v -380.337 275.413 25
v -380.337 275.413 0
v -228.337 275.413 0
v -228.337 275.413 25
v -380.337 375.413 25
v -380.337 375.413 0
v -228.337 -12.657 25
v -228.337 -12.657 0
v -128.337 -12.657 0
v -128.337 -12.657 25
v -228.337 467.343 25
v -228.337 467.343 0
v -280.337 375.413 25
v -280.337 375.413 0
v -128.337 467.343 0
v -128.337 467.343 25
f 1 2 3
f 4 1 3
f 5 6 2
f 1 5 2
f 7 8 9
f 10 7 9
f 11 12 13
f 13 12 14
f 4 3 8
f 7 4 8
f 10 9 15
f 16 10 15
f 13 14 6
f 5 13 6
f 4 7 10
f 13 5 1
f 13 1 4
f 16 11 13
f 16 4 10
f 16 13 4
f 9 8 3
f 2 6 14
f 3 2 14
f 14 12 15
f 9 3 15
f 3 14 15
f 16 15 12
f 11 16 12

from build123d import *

# Parameters (mm, degrees)
F1_DEPTH = 25
F2_DEPTH = 25
F3_DEPTH = 25
F4_DEPTH = 25


with BuildPart() as f1:
    # F0 (on Top) → F1 (new body)
    with BuildSketch(Plane.XY):
        Polygon((-128.336711, 467.34343), (-228.336711, 467.34343), (-280.336711, 375.412752), (-380.336711, 375.412752), (-380.336711, 275.412752), (-228.336711, 275.412752), (-228.336711, -12.65657), (-128.336711, -12.65657), align=None)
    extrude(amount=F1_DEPTH)

    # F0 (on Top) → F2 (join)
    with BuildSketch(Plane.XY):
        Polygon((-128.336711, 467.34343), (-228.336711, 467.34343), (-280.336711, 375.412752), (-380.336711, 375.412752), (-380.336711, 275.412752), (-228.336711, 275.412752), (-228.336711, -12.65657), (-128.336711, -12.65657), align=None)
    extrude(amount=F2_DEPTH)

    # F0 (on Top) → F3 (join)
    with BuildSketch(Plane.XY):
        Polygon((-128.336711, 467.34343), (-228.336711, 467.34343), (-280.336711, 375.412752), (-380.336711, 375.412752), (-380.336711, 275.412752), (-228.336711, 275.412752), (-228.336711, -12.65657), (-128.336711, -12.65657), align=None)
    extrude(amount=F3_DEPTH)

    # F0 (on Top) → F4 (join)
    with BuildSketch(Plane.XY):
        Polygon((-128.336711, 467.34343), (-228.336711, 467.34343), (-280.336711, 375.412752), (-380.336711, 375.412752), (-380.336711, 275.412752), (-228.336711, 275.412752), (-228.336711, -12.65657), (-128.336711, -12.65657), align=None)
    extrude(amount=F4_DEPTH)


solid = f1.part
